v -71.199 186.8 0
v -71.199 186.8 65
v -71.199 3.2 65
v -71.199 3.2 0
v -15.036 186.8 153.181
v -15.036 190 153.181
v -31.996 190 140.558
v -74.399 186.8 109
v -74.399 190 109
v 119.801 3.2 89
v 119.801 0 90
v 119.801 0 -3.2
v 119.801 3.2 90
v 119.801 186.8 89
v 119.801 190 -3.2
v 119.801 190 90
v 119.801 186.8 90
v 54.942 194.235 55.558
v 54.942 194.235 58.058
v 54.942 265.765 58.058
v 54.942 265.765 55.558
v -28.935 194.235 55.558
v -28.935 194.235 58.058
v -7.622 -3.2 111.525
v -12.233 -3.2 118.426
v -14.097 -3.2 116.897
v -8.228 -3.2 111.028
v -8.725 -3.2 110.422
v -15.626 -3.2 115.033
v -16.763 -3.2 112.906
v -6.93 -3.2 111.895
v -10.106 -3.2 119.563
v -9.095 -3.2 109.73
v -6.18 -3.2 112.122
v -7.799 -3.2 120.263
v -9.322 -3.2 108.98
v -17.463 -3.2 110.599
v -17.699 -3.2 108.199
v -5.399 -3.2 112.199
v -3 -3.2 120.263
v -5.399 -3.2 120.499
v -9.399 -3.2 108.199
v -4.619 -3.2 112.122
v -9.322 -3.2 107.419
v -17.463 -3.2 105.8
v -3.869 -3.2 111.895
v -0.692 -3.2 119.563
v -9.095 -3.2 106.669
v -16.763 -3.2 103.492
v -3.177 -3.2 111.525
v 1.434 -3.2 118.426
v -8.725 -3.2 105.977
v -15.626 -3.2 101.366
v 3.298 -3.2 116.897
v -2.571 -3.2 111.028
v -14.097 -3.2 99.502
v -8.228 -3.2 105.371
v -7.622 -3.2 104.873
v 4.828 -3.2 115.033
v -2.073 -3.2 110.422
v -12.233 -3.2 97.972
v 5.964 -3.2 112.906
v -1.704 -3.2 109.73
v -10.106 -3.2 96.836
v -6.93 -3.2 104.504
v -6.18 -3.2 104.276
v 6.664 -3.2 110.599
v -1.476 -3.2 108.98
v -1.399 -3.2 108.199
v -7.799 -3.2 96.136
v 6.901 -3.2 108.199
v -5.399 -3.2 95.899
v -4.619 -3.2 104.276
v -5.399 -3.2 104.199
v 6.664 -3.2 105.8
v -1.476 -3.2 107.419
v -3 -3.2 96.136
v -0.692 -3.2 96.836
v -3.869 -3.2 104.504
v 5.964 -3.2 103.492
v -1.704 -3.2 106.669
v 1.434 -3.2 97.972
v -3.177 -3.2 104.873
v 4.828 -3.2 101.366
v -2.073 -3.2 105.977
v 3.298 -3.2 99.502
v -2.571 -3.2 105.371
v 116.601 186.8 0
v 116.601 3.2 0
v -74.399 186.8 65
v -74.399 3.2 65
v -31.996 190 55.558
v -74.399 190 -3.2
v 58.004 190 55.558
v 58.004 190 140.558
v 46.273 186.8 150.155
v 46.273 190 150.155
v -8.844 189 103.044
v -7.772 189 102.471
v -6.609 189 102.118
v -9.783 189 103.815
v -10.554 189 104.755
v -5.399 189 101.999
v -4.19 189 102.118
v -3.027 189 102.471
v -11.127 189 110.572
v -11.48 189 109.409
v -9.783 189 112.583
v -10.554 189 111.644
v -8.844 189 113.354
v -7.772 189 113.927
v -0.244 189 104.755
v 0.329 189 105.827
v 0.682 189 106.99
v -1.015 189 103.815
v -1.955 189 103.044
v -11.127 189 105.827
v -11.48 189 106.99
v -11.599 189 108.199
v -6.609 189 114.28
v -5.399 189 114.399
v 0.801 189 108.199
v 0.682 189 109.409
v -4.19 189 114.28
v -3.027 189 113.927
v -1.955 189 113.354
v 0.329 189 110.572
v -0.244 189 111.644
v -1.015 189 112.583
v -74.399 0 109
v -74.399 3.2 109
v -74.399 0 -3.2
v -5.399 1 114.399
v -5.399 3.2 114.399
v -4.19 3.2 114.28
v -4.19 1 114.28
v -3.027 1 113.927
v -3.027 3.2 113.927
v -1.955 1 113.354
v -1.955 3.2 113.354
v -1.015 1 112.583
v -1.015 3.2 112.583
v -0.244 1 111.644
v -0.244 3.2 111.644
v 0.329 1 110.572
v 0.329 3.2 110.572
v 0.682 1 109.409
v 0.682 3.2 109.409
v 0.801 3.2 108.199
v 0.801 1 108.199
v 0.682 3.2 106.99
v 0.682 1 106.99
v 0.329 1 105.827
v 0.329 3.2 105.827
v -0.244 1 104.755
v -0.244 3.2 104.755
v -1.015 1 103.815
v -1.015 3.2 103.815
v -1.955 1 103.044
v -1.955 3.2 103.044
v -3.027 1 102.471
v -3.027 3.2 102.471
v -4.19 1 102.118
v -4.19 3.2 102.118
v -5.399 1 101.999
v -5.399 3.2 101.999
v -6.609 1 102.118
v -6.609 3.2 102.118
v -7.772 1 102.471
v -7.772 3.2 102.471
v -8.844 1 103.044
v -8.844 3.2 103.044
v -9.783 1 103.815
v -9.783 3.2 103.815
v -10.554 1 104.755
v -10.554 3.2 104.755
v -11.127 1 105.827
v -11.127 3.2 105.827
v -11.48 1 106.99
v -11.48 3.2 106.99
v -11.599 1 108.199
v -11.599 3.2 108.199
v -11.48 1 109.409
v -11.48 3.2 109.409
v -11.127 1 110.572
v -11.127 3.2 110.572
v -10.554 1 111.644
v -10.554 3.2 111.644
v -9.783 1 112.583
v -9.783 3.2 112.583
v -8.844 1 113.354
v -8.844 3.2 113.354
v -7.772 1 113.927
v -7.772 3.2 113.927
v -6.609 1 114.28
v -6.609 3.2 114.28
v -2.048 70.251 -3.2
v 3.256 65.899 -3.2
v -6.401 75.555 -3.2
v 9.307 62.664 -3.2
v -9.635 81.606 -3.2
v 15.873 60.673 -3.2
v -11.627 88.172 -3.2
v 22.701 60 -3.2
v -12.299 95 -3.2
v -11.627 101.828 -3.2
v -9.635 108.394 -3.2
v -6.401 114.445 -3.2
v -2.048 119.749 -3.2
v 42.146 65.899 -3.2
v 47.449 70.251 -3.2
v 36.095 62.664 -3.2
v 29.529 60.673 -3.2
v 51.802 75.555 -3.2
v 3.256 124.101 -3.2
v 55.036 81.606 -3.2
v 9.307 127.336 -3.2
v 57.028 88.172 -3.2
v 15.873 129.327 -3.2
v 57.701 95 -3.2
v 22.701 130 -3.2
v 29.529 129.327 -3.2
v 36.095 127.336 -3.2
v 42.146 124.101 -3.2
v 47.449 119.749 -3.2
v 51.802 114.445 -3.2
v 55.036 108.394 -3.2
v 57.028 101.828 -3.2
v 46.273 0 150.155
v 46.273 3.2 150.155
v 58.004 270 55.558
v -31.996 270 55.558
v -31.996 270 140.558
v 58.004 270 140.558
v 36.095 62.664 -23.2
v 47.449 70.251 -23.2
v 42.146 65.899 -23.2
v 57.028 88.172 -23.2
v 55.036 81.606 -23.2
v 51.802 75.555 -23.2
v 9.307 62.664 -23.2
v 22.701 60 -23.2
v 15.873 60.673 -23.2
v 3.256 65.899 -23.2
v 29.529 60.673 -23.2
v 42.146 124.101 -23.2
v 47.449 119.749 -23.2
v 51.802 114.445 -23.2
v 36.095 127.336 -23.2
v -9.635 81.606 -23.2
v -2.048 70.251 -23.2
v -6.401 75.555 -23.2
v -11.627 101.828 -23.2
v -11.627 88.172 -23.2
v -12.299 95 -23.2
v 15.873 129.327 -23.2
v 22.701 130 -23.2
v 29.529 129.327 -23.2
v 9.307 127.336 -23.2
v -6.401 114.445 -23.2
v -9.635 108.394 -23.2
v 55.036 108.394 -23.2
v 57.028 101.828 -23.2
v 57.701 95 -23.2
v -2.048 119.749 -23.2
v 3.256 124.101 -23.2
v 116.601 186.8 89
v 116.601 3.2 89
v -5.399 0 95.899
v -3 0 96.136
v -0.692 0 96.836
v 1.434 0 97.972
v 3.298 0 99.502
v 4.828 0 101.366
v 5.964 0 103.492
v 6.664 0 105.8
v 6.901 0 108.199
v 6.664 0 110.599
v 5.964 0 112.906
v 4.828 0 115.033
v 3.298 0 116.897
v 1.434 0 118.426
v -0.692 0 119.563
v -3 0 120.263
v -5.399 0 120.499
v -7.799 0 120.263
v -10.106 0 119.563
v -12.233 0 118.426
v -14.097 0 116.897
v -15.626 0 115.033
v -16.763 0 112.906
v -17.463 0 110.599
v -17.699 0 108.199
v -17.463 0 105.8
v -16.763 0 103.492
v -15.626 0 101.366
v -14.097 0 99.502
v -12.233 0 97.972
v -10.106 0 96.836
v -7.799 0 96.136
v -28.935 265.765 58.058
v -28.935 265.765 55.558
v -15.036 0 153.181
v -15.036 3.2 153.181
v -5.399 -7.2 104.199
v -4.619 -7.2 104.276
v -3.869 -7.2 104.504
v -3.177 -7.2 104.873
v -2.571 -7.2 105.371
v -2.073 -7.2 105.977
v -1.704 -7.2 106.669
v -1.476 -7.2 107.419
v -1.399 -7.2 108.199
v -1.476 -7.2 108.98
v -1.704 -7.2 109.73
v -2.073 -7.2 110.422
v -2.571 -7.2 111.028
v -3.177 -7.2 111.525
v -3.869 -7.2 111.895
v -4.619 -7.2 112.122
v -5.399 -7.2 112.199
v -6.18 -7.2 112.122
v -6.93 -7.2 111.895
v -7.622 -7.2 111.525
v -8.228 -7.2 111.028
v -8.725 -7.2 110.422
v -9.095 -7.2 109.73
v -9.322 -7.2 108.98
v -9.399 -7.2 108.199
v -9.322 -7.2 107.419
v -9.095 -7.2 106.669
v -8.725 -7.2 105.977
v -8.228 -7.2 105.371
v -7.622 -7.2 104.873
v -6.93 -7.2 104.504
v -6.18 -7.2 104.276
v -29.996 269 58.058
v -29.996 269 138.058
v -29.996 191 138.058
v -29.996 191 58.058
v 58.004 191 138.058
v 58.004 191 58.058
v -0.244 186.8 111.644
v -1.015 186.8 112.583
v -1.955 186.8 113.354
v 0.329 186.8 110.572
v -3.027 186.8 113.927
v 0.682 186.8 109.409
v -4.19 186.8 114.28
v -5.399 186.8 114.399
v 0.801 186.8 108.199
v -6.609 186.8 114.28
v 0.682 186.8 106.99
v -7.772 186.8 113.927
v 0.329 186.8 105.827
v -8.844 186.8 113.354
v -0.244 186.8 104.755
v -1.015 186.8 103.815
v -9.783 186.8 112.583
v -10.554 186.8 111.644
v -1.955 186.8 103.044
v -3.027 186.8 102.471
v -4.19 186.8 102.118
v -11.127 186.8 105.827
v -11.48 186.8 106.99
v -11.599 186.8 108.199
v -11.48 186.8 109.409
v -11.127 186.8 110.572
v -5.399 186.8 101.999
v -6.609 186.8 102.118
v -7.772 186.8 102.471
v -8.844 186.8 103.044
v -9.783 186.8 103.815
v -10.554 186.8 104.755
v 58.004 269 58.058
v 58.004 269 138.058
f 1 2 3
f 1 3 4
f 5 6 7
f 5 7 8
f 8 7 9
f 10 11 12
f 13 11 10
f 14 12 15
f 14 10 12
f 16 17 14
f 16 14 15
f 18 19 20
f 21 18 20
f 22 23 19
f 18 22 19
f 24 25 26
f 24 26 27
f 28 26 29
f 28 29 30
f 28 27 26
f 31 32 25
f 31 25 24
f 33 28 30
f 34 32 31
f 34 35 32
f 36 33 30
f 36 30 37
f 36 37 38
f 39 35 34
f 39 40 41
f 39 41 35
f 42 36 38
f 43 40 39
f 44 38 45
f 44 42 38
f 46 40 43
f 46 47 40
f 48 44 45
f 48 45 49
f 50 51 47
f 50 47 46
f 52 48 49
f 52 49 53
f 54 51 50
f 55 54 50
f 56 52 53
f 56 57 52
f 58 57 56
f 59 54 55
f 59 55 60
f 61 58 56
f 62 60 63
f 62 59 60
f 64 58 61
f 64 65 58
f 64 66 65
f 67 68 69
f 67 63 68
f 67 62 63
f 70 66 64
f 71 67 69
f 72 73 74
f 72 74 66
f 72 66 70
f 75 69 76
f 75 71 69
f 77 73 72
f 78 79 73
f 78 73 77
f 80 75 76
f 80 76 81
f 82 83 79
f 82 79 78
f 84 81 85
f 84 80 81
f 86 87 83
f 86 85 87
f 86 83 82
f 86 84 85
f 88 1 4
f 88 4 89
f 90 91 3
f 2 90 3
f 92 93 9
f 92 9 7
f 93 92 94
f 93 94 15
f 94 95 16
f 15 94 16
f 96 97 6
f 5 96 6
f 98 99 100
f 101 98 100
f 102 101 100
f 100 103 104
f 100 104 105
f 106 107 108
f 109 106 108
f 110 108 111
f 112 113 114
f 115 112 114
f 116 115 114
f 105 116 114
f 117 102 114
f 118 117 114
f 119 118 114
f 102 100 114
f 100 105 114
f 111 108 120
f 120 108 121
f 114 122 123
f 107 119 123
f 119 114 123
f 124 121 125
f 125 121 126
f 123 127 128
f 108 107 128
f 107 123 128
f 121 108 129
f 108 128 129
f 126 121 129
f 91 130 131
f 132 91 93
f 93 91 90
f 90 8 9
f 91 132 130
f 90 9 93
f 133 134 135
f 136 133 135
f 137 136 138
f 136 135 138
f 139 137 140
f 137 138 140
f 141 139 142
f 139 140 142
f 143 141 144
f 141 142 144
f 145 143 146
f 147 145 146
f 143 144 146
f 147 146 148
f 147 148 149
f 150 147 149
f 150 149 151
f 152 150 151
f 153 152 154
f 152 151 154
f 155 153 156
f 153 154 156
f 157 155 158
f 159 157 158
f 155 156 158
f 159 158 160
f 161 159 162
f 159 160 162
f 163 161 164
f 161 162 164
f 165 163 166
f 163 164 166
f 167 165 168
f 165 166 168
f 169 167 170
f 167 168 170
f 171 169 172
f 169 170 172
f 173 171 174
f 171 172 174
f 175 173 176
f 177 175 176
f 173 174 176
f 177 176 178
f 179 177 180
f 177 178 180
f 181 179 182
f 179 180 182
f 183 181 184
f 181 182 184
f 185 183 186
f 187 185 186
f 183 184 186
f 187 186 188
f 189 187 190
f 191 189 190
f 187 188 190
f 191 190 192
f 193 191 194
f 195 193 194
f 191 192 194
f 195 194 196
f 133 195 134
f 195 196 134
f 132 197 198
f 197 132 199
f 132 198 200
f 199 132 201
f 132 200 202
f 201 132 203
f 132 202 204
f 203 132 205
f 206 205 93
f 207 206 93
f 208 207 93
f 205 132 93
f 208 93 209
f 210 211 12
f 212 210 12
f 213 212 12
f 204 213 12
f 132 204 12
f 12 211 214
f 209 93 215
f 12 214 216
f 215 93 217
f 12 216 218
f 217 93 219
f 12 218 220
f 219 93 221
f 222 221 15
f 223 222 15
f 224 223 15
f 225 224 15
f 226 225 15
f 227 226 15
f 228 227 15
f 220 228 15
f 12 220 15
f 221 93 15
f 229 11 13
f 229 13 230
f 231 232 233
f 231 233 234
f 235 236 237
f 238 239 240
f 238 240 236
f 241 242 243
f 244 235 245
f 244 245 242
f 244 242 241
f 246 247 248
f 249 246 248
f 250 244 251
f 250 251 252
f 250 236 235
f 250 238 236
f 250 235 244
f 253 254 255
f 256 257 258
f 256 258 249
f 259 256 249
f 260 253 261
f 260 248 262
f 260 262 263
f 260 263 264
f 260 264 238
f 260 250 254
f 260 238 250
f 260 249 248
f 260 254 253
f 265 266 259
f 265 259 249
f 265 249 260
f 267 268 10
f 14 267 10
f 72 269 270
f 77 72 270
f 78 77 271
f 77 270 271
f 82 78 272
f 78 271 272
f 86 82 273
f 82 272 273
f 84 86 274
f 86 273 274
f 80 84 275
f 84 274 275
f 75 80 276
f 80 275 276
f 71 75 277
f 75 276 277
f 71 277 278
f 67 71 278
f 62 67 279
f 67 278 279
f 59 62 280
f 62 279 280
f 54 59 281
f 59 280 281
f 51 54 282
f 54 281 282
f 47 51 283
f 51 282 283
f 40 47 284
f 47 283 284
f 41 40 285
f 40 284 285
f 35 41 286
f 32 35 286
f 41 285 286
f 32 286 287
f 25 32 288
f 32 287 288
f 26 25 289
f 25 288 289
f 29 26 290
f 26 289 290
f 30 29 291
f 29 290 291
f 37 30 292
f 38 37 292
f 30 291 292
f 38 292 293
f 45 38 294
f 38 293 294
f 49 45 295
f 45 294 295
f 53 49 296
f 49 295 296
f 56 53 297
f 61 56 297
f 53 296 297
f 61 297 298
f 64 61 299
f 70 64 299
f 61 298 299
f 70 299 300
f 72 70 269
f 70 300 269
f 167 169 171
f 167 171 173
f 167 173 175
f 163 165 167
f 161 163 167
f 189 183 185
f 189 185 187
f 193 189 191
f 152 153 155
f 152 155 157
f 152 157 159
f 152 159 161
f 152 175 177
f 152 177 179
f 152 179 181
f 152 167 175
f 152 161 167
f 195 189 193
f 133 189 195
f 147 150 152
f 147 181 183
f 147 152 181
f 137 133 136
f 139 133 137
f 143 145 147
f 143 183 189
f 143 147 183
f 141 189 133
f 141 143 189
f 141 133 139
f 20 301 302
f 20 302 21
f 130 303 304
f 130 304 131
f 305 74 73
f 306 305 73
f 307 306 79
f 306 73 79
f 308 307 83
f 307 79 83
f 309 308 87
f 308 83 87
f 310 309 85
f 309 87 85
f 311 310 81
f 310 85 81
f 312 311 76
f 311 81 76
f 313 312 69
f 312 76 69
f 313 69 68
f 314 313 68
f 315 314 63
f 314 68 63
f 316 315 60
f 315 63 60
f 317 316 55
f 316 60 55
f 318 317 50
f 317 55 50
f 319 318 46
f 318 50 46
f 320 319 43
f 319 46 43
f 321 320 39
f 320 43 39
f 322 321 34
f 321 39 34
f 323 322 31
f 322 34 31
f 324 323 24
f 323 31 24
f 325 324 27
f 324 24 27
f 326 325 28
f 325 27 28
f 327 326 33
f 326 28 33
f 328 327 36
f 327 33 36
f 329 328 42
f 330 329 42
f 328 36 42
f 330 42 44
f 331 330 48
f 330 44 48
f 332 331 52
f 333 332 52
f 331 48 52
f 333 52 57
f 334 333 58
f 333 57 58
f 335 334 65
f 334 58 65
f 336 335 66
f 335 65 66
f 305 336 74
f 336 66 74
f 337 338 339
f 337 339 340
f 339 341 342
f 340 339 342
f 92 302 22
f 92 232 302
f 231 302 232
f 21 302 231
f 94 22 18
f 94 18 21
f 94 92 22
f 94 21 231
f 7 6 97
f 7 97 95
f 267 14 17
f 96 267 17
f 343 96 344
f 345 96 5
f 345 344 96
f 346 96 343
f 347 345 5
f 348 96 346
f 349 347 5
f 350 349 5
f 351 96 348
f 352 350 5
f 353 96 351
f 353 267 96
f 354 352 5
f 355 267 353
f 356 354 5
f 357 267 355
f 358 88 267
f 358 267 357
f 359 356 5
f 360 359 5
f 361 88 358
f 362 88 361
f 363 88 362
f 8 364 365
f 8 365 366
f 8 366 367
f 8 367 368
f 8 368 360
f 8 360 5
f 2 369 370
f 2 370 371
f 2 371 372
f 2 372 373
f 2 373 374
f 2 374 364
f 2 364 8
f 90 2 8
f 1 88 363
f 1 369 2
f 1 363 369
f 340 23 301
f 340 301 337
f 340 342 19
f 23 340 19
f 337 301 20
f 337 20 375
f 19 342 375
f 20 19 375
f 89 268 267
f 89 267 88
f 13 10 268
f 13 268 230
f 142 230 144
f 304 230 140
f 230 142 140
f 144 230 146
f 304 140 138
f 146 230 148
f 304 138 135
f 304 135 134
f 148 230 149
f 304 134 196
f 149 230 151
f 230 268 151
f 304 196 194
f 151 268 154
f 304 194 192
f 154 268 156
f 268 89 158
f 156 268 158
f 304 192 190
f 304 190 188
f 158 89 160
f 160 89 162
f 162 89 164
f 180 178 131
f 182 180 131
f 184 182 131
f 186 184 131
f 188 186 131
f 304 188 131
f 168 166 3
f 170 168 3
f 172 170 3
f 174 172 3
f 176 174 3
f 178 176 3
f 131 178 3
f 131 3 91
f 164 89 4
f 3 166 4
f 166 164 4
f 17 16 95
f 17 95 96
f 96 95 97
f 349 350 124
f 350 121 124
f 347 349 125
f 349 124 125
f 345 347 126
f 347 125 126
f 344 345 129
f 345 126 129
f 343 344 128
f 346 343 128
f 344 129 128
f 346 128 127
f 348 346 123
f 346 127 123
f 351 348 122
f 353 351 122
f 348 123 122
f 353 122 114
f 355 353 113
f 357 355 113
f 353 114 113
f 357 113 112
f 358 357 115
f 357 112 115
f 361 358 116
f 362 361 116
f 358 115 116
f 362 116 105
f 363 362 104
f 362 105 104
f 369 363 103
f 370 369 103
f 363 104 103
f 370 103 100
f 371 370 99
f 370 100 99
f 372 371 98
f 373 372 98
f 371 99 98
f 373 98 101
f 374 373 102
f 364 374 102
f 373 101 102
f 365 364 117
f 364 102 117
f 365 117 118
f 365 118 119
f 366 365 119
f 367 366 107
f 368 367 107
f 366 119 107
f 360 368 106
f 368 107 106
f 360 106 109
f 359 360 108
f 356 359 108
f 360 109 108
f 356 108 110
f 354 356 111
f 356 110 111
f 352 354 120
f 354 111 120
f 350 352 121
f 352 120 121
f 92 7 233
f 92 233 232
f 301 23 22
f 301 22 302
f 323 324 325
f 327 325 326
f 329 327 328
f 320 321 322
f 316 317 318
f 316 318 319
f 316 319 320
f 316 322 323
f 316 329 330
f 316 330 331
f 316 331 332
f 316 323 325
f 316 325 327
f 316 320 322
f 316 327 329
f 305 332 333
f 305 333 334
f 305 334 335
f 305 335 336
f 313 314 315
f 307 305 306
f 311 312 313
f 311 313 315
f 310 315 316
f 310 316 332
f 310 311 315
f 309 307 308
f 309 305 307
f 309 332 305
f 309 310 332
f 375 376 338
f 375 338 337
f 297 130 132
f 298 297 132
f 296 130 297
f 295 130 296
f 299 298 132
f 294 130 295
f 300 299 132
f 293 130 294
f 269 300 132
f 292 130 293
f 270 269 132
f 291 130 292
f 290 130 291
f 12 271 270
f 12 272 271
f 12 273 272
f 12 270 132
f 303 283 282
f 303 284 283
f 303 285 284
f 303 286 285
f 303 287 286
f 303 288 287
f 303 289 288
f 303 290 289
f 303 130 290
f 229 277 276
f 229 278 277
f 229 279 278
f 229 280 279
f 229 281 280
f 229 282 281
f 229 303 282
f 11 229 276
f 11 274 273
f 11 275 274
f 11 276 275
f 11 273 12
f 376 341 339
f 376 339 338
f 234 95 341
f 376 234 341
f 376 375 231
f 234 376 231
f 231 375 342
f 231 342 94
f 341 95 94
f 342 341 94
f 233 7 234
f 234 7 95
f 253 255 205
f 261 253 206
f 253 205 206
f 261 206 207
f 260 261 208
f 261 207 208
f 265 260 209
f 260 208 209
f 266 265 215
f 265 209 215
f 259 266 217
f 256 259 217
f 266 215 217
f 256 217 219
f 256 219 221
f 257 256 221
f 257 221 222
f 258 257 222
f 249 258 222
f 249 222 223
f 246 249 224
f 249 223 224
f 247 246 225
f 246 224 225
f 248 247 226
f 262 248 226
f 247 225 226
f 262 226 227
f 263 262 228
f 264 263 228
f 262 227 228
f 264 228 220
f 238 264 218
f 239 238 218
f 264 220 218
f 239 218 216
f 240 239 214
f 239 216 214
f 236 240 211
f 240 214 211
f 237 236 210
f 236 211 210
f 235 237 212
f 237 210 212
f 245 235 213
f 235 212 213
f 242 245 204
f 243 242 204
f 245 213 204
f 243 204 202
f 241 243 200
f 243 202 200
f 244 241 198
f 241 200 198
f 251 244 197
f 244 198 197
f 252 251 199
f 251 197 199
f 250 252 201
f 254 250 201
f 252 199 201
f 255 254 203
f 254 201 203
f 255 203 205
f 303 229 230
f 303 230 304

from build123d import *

# Parameters (mm, degrees)
BOSS_EXTRUDE1_DEPTH = 3.2
SKETCH3_R           = 12.3
BOSS_EXTRUDE2_DEPTH = 3.2
SKETCH4_R           = 4
BOSS_EXTRUDE3_DEPTH = 4
SKETCH6_W           = 3.2
SKETCH6_H           = 65
BOSS_EXTRUDE4_DEPTH = 190
SKETCH8_W           = 3.2
SKETCH8_H           = 89
BOSS_EXTRUDE5_DEPTH = 190
SKETCH9_W           = 194.2
SKETCH9_H           = 190
BOSS_EXTRUDE7_DEPTH = 3.2
SKETCH11_R          = 6.2
CUT_EXTRUDE2_DEPTH  = 94
SKETCH12_R          = 35
BOSS_EXTRUDE8_DEPTH = 20
SKETCH14_W          = 90
SKETCH14_H          = 85
BOSS_EXTRUDE9_DEPTH = 80
SKETCH15_W          = 80
SKETCH15_H          = 78
CUT_EXTRUDE3_DEPTH  = 88
SKETCH16_W          = 83.876304214
SKETCH16_H          = 71.530824042
CUT_EXTRUDE7_DEPTH  = 10


with BuildPart() as part:
    # Sketch1 → Boss-Extrude1 (new body)
    with BuildSketch(Plane(origin=(0, 0, 0), x_dir=(1, 0, 0), z_dir=(0, 1, 0))):
        Polygon((-71.199297972, 0), (119.800702028, 0), (119.800702028, -90), (46.272924854, -150.155348756), (-15.035731115, -153.181069815), (-74.399297972, -109), (-74.399297972, -65), (-71.199297972, -65), align=None)
    boss_extrude1 = extrude(amount=BOSS_EXTRUDE1_DEPTH)

    # Sketch3 → Boss-Extrude2 (add)
    with BuildSketch(Plane.XZ):
        with Locations(Location((-5.399297972, 108.199281837, 0), (0, 0, 270))):
            Circle(SKETCH3_R)
    boss_extrude2 = extrude(amount=BOSS_EXTRUDE2_DEPTH)

    # Sketch4 → Boss-Extrude3 (add)
    with BuildSketch(Plane.XZ.offset(3.2)):
        with Locations(Location((-5.399297972, 108.199281837, 0), (0, 0, 270))):
            Circle(SKETCH4_R)
    boss_extrude3 = extrude(amount=BOSS_EXTRUDE3_DEPTH)

    # Sketch6 → Boss-Extrude4 (add)
    with BuildSketch(Plane(origin=(0, 0, 0), x_dir=(1, 0, 0), z_dir=(0, 1, 0))):
        with Locations((-72.799297972, -32.5)):
            Rectangle(SKETCH6_W, SKETCH6_H)
    extrude(amount=BOSS_EXTRUDE4_DEPTH)

    # Sketch8 → Boss-Extrude5 (add)
    with BuildSketch(Plane(origin=(0, 0, 0), x_dir=(1, 0, 0), z_dir=(0, 1, 0))):
        with Locations((118.200702028, -44.5)):
            Rectangle(SKETCH8_W, SKETCH8_H)
    extrude(amount=BOSS_EXTRUDE5_DEPTH)

    # Mirror1: Boss-Extrude1, Boss-Extrude2, Boss-Extrude3 across plane
    add(boss_extrude1.mirror(Plane(origin=(0, 95, 0), x_dir=(0, 0, 1), z_dir=(0, -1, 0))))
    add(boss_extrude2.mirror(Plane(origin=(0, 95, 0), x_dir=(0, 0, 1), z_dir=(0, -1, 0))))
    add(boss_extrude3.mirror(Plane(origin=(0, 95, 0), x_dir=(0, 0, 1), z_dir=(0, -1, 0))))

    # Sketch9 → Boss-Extrude7 (add)
    with BuildSketch(Plane.XY):
        with Locations((22.700702028, 95)):
            Rectangle(SKETCH9_W, SKETCH9_H)
    extrude(amount=-BOSS_EXTRUDE7_DEPTH)

    # Sketch11 → Cut-Extrude2 (cut, symmetric)
    with BuildSketch(Plane(origin=(0, 95, 0), x_dir=(1, 0, 0), z_dir=(0, 1, 0))):
        with Locations(Location((-5.399297972, -108.199281837, 0), (0, 0, 270))):
            Circle(SKETCH11_R)
    extrude(amount=CUT_EXTRUDE2_DEPTH, both=True, mode=Mode.SUBTRACT)

    # Sketch12 → Boss-Extrude8 (add)
    with BuildSketch(Plane(origin=(0, 0, -3.2), x_dir=(-1, 0, 0), z_dir=(0, 0, -1))):
        with Locations((-22.700702028, 95)):
            Circle(SKETCH12_R)
    extrude(amount=BOSS_EXTRUDE8_DEPTH)

    # Sketch14 → Boss-Extrude9 (add)
    with BuildSketch(Plane(origin=(0, 190, 0), x_dir=(1, 0, 0), z_dir=(0, 1, 0))):
        with Locations((13.00356987, -98.058145234)):
            Rectangle(SKETCH14_W, SKETCH14_H)
    extrude(amount=BOSS_EXTRUDE9_DEPTH)

    # Sketch15 → Cut-Extrude3 (cut)
    with BuildSketch(Plane(origin=(58.00356987, 0, 0), x_dir=(0, 0, -1), z_dir=(1, 0, 0))):
        with Locations((-98.058145234, 230)):
            Rectangle(SKETCH15_W, SKETCH15_H)
    extrude(amount=-CUT_EXTRUDE3_DEPTH, mode=Mode.SUBTRACT)

    # Sketch16 → Cut-Extrude7 (cut)
    with BuildSketch(Plane.XY.offset(58.058145234)):
        with Locations((13.00356987, 230)):
            Rectangle(SKETCH16_W, SKETCH16_H)
    extrude(amount=-CUT_EXTRUDE7_DEPTH, mode=Mode.SUBTRACT)


solid = part.part
